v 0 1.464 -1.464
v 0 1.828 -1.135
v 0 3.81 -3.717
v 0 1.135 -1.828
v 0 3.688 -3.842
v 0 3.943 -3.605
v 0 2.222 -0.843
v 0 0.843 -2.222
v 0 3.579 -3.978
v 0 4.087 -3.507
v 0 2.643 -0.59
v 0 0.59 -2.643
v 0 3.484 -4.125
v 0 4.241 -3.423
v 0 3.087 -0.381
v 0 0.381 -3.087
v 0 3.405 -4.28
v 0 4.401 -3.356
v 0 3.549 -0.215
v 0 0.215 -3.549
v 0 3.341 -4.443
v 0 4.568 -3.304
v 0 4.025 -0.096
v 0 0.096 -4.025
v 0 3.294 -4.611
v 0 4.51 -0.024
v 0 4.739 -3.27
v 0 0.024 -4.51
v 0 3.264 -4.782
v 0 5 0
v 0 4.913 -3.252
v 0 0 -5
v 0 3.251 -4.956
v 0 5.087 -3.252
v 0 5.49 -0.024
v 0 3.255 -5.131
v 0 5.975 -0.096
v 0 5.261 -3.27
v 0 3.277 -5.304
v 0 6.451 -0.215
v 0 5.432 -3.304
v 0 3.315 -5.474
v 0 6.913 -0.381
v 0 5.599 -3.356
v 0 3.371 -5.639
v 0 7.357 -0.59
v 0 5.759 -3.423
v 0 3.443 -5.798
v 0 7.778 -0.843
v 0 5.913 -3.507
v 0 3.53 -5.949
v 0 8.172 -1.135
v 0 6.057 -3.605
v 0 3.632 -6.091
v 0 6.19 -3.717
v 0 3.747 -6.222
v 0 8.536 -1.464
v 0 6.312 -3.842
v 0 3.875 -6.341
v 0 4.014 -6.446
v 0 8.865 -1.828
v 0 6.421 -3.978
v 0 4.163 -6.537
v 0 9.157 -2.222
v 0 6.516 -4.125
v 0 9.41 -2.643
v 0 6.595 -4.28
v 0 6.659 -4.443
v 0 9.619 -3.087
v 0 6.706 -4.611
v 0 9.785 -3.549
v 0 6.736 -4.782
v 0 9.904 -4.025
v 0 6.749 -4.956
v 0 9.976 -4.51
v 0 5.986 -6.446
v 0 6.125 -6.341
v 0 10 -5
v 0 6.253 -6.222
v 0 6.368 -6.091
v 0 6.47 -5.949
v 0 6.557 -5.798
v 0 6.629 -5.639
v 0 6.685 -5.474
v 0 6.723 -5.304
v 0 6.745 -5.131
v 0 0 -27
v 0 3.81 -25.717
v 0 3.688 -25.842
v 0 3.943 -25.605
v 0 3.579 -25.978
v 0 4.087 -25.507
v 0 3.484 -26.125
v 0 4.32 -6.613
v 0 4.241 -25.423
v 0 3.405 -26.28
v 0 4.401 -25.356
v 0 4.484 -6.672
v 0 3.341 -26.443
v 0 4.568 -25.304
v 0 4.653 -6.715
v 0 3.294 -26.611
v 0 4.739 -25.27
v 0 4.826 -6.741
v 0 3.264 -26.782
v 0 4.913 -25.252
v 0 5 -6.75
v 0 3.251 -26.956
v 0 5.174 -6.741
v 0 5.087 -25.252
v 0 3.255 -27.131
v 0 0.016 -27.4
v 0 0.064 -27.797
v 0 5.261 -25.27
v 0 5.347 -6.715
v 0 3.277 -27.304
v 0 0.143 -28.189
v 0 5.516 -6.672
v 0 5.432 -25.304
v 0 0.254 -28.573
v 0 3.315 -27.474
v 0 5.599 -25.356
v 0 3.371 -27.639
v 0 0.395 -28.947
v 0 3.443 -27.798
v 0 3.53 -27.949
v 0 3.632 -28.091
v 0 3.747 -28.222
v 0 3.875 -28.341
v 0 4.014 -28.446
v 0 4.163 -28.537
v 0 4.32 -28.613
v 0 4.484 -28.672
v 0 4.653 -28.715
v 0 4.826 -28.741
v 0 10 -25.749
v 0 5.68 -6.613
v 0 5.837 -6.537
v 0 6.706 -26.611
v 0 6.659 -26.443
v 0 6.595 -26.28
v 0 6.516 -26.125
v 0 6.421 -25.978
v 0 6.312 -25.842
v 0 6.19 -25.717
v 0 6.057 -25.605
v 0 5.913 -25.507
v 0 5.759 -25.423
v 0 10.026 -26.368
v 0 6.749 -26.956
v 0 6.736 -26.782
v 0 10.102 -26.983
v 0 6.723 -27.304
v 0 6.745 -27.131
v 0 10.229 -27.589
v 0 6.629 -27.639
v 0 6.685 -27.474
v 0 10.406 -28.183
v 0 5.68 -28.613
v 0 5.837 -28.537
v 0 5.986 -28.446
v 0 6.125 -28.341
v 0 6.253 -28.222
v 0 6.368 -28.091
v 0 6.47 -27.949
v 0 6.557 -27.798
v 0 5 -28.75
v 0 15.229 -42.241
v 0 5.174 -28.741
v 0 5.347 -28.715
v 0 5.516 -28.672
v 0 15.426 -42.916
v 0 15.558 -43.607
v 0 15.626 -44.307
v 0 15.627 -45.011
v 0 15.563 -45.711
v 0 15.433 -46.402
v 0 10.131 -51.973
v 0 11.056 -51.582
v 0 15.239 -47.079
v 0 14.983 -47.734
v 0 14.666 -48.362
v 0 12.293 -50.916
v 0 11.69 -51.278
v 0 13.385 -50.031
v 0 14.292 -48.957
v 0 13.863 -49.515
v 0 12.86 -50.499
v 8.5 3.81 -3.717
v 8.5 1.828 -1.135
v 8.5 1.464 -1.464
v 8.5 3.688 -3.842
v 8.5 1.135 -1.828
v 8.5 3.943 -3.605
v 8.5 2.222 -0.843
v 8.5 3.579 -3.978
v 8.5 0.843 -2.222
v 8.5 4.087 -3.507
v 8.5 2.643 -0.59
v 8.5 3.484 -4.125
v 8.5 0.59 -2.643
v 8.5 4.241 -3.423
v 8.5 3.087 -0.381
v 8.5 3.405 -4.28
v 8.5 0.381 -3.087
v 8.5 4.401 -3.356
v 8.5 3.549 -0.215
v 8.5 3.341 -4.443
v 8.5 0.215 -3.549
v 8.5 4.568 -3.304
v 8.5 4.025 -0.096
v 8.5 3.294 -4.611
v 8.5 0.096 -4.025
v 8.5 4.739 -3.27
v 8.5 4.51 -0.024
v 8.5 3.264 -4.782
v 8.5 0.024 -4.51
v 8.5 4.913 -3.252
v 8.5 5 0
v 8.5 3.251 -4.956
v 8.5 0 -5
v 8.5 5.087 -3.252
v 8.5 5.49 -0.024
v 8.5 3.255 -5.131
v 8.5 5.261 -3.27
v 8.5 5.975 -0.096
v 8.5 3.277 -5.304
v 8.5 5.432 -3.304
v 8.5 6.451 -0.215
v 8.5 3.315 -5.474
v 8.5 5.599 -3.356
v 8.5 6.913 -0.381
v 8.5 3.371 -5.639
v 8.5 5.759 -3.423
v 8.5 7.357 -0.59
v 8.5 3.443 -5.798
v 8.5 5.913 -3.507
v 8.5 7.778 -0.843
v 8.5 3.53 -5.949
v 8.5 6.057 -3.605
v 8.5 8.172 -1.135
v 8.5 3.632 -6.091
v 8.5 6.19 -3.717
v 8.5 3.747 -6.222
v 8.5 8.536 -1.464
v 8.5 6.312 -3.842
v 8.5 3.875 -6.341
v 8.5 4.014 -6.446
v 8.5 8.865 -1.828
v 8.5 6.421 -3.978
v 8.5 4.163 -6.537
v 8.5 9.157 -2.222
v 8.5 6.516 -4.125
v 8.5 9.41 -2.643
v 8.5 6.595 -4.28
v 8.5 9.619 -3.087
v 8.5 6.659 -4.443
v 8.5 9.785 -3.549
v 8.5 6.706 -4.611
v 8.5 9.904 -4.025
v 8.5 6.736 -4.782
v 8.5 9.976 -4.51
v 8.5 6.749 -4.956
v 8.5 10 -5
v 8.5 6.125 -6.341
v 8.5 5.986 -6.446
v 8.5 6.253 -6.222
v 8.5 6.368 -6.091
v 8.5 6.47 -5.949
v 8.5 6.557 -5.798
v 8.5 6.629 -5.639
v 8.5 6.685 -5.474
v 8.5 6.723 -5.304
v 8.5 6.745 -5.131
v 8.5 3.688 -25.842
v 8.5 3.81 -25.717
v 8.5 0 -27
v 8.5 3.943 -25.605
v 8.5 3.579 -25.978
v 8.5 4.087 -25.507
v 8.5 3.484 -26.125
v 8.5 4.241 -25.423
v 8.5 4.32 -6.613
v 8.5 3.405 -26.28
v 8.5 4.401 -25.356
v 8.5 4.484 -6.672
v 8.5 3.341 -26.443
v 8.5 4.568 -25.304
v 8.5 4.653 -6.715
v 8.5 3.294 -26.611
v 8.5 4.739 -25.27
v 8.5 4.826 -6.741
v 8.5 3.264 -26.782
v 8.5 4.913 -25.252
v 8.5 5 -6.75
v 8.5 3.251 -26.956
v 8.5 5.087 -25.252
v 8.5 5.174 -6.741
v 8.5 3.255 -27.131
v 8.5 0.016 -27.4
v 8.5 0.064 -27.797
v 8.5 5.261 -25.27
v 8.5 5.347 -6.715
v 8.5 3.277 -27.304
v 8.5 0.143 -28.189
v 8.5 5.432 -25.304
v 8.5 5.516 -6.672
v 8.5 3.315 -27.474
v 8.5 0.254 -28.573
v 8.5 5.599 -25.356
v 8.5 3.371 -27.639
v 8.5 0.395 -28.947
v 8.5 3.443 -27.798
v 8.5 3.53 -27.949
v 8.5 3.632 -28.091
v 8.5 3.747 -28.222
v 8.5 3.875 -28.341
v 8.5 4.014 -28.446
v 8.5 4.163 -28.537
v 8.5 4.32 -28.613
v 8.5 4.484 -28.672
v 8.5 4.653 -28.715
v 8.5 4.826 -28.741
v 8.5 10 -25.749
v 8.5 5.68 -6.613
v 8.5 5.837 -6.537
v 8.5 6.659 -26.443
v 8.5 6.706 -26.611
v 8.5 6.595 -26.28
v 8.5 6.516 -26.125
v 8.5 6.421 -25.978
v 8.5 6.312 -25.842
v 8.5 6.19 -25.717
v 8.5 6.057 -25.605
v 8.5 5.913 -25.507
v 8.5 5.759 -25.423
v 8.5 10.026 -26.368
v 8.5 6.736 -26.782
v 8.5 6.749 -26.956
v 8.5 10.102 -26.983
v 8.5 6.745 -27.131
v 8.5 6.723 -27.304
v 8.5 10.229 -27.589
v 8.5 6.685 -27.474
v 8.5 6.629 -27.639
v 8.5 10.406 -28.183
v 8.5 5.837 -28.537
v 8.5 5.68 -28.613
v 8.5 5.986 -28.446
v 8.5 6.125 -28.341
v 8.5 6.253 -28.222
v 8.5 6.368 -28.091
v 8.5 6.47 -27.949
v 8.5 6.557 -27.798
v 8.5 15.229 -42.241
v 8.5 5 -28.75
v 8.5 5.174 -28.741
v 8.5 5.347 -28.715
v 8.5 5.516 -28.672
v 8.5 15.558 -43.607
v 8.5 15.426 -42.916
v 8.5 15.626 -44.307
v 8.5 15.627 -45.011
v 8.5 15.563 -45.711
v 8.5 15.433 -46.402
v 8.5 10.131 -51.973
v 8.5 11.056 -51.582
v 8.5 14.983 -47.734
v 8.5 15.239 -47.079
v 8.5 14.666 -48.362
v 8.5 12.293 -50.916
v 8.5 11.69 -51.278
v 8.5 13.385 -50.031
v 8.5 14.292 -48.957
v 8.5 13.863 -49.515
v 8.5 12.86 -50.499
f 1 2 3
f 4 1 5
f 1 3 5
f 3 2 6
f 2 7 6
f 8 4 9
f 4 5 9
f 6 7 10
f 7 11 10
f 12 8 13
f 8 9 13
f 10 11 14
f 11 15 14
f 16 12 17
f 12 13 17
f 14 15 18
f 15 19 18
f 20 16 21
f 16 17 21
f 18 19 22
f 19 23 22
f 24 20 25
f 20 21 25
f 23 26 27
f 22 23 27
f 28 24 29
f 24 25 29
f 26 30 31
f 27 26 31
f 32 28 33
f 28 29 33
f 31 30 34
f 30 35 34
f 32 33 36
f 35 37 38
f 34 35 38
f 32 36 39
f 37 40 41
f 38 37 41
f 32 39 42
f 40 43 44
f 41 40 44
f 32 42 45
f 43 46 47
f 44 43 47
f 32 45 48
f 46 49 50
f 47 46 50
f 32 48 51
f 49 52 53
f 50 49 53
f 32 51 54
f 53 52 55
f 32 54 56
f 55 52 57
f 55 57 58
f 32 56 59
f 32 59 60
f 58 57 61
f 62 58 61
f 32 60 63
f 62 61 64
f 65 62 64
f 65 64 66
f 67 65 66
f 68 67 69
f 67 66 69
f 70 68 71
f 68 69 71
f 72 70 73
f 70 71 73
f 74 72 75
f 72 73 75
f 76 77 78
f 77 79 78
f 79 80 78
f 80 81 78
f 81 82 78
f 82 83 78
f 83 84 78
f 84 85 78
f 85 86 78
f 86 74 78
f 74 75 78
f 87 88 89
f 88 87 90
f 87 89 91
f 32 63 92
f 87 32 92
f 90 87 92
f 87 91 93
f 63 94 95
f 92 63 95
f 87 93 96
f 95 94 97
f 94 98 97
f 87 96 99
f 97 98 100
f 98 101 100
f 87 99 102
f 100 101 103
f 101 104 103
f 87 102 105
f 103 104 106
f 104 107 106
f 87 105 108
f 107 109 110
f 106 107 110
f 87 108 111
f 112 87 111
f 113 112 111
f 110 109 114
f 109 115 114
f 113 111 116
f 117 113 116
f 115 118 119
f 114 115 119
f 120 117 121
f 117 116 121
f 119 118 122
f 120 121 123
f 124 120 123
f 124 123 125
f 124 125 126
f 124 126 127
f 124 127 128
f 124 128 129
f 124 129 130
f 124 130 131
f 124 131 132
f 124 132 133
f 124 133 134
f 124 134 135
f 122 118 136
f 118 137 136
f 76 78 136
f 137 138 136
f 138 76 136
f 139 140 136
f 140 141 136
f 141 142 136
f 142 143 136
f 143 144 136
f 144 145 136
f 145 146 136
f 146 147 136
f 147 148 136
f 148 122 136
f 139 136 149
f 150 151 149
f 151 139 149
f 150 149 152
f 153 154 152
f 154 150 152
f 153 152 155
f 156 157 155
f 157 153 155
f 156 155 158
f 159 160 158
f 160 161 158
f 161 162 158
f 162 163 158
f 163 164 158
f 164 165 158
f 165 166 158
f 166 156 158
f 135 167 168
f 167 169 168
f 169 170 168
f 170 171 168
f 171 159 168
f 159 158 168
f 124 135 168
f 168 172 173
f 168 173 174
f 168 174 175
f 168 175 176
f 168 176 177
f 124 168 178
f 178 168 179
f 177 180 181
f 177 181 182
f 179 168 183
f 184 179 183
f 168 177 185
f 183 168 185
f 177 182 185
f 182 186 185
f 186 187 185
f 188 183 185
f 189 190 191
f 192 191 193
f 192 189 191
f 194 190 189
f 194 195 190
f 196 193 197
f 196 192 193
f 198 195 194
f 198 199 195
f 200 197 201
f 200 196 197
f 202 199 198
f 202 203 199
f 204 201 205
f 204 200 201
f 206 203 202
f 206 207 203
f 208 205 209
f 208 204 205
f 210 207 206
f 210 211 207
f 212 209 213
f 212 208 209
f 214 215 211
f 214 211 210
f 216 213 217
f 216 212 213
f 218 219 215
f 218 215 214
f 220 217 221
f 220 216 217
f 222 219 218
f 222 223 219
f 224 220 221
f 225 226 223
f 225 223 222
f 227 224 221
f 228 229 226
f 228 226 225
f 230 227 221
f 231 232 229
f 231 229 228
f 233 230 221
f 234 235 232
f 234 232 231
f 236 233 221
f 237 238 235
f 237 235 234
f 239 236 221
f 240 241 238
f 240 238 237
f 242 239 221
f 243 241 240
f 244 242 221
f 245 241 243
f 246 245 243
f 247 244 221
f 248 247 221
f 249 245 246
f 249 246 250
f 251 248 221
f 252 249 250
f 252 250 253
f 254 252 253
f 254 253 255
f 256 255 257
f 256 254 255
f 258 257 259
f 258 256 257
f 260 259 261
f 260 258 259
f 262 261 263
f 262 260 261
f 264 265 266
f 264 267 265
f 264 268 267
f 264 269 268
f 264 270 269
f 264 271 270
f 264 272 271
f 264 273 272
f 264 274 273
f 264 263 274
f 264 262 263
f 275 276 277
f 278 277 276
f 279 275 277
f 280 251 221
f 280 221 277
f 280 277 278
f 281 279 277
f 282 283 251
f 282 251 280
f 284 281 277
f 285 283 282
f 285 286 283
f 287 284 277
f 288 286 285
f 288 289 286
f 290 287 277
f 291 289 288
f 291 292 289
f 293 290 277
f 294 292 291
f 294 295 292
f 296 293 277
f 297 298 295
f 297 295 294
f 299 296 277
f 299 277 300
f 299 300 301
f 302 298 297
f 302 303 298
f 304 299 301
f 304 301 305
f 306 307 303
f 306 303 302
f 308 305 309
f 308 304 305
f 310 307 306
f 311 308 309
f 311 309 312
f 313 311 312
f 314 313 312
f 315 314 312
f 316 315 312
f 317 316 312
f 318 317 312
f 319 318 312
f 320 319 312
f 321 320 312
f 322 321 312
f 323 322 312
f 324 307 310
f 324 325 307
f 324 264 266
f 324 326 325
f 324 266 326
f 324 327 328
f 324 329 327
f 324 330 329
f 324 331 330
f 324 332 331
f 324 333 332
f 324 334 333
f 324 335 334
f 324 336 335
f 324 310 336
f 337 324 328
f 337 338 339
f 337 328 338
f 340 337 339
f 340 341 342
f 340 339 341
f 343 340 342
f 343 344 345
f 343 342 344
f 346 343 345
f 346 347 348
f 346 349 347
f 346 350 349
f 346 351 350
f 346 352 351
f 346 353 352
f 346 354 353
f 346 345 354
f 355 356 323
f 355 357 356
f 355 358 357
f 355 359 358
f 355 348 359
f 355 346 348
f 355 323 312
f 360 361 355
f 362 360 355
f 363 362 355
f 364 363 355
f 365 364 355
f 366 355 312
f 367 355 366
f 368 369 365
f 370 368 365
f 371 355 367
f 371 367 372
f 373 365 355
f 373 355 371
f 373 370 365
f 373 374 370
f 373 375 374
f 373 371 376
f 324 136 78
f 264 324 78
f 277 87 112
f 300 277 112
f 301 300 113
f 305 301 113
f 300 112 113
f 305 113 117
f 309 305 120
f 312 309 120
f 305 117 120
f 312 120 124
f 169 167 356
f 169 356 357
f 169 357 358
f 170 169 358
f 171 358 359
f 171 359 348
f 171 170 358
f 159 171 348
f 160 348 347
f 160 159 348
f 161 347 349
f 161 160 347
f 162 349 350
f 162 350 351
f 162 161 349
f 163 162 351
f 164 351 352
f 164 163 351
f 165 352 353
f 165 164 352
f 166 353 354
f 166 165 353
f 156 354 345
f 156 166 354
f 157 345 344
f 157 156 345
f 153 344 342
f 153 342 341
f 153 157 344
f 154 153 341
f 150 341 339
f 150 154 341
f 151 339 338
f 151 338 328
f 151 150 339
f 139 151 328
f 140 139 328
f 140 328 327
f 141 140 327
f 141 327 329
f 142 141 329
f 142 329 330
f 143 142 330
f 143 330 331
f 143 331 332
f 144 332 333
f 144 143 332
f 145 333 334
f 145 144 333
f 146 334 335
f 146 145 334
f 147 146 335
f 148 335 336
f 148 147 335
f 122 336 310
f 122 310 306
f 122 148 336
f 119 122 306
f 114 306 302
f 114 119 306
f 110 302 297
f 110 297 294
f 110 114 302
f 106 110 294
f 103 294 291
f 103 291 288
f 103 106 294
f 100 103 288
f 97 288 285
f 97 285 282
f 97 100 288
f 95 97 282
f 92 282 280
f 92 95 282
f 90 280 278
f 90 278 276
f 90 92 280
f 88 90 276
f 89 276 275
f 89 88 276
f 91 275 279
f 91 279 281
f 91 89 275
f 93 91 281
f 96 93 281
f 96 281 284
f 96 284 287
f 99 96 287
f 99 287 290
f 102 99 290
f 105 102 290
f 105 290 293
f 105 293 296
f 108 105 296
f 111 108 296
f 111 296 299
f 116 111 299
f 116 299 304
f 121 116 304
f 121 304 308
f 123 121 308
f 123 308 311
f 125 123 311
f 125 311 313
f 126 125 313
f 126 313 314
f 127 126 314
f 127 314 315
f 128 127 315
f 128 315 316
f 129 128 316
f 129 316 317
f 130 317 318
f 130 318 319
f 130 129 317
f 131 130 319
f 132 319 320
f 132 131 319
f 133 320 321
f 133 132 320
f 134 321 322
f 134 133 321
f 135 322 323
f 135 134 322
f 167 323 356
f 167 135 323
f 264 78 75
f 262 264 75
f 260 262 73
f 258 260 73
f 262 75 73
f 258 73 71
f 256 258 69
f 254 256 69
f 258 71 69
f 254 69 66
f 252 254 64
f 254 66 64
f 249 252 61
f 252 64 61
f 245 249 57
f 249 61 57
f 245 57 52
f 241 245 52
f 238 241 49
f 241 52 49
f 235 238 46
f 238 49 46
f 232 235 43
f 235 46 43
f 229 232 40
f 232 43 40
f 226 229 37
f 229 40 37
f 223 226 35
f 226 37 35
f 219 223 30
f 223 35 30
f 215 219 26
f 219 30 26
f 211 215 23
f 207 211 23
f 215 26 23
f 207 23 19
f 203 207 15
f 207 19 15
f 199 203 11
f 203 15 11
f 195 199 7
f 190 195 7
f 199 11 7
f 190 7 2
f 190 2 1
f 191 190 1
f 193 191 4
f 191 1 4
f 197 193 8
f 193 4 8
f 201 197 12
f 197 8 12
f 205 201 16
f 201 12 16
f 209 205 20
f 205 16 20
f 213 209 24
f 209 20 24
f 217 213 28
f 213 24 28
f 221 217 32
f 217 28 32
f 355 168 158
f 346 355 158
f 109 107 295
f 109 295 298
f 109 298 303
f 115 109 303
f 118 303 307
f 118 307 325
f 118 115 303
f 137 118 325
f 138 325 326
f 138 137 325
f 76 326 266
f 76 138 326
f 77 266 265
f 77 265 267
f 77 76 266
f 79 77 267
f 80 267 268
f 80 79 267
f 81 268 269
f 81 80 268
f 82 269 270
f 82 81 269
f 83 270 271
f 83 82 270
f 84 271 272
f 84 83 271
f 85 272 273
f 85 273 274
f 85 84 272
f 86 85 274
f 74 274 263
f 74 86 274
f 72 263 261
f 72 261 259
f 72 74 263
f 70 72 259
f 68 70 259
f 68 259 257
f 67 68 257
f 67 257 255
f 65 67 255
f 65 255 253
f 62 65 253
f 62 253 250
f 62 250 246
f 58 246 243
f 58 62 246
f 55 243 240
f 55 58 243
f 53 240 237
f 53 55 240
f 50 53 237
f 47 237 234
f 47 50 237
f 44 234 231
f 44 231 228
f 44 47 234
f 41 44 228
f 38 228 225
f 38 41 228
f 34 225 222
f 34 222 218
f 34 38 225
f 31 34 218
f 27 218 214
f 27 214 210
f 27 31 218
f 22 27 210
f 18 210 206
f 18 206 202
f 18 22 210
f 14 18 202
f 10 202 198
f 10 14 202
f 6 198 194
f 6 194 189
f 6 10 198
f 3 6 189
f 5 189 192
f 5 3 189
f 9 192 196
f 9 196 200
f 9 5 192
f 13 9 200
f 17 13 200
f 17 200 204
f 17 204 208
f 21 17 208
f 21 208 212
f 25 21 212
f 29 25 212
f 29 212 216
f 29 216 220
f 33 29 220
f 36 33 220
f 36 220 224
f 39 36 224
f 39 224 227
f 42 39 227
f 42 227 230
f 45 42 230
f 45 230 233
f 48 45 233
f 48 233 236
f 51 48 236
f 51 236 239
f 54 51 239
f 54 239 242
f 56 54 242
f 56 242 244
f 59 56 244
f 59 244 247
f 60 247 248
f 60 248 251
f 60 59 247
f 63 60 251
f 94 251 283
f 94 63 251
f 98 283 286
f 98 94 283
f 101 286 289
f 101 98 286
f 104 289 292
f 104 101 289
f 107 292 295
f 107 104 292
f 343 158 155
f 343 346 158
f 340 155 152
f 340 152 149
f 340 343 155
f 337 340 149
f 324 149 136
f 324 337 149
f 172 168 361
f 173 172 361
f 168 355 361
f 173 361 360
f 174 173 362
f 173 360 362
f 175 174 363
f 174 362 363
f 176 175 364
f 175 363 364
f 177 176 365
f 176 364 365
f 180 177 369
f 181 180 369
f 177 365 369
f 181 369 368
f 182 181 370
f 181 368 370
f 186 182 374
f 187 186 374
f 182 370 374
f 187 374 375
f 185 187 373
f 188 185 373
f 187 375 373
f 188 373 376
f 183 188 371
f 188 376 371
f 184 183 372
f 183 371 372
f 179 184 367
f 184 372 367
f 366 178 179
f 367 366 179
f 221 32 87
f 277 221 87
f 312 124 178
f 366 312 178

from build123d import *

# Parameters (mm, degrees)
SKETCH1_R           = 1.75
BOSS_EXTRUDE1_DEPTH = 8.5
BOSS_EXTRUDE2_START = -8.5
BOSS_EXTRUDE2_DEPTH = 8.5
FILLET1_R           = 7.5


with BuildPart() as part:
    # Sketch1 → Boss-Extrude1 (new body)
    with BuildSketch(Plane(origin=(0, 0, 0), x_dir=(0, 0, -1), z_dir=(1, 0, 0))):
        with BuildLine():
            Line((27, 10), (5, 10))
            ThreePointArc((5, 10), (0, 5), (5, 0))
            Line((5, 0), (27, 0))
            ThreePointArc((27, 0), (32, 5), (27, 10))
        make_face()
        with Locations((5, 5)):
            Circle(SKETCH1_R, mode=Mode.SUBTRACT)
        with Locations((27, 5)):
            Circle(SKETCH1_R, mode=Mode.SUBTRACT)
    extrude(amount=BOSS_EXTRUDE1_DEPTH)

    # Sketch2 → Boss-Extrude2 (add)
    with BuildSketch(Plane(origin=(8.5, 0, 0), x_dir=(0, 0, -1), z_dir=(1, 0, 0)).offset(BOSS_EXTRUDE2_START)):
        with BuildLine():
            Line((48.857901547, 17.499285579), (27, 10))
            ThreePointArc((27, 10), (31.900318254, 5.993418847), (28.947227404, 0.394752402))
            Line((28.947227404, 0.394752402), (51.973465393, 10.130889422))
            Line((51.973465393, 10.130889422), (48.857901547, 17.499285579))
        make_face()
    extrude(amount=BOSS_EXTRUDE2_DEPTH)

    # Fillet1
    fillet1_edges = [part.edges().sort_by_distance(p)[0] for p in [
        (4.25, 10, -27),
        (4.25, 17.499285579, -48.857901547),
    ]]
    fillet(fillet1_edges, radius=FILLET1_R)


solid = part.part
